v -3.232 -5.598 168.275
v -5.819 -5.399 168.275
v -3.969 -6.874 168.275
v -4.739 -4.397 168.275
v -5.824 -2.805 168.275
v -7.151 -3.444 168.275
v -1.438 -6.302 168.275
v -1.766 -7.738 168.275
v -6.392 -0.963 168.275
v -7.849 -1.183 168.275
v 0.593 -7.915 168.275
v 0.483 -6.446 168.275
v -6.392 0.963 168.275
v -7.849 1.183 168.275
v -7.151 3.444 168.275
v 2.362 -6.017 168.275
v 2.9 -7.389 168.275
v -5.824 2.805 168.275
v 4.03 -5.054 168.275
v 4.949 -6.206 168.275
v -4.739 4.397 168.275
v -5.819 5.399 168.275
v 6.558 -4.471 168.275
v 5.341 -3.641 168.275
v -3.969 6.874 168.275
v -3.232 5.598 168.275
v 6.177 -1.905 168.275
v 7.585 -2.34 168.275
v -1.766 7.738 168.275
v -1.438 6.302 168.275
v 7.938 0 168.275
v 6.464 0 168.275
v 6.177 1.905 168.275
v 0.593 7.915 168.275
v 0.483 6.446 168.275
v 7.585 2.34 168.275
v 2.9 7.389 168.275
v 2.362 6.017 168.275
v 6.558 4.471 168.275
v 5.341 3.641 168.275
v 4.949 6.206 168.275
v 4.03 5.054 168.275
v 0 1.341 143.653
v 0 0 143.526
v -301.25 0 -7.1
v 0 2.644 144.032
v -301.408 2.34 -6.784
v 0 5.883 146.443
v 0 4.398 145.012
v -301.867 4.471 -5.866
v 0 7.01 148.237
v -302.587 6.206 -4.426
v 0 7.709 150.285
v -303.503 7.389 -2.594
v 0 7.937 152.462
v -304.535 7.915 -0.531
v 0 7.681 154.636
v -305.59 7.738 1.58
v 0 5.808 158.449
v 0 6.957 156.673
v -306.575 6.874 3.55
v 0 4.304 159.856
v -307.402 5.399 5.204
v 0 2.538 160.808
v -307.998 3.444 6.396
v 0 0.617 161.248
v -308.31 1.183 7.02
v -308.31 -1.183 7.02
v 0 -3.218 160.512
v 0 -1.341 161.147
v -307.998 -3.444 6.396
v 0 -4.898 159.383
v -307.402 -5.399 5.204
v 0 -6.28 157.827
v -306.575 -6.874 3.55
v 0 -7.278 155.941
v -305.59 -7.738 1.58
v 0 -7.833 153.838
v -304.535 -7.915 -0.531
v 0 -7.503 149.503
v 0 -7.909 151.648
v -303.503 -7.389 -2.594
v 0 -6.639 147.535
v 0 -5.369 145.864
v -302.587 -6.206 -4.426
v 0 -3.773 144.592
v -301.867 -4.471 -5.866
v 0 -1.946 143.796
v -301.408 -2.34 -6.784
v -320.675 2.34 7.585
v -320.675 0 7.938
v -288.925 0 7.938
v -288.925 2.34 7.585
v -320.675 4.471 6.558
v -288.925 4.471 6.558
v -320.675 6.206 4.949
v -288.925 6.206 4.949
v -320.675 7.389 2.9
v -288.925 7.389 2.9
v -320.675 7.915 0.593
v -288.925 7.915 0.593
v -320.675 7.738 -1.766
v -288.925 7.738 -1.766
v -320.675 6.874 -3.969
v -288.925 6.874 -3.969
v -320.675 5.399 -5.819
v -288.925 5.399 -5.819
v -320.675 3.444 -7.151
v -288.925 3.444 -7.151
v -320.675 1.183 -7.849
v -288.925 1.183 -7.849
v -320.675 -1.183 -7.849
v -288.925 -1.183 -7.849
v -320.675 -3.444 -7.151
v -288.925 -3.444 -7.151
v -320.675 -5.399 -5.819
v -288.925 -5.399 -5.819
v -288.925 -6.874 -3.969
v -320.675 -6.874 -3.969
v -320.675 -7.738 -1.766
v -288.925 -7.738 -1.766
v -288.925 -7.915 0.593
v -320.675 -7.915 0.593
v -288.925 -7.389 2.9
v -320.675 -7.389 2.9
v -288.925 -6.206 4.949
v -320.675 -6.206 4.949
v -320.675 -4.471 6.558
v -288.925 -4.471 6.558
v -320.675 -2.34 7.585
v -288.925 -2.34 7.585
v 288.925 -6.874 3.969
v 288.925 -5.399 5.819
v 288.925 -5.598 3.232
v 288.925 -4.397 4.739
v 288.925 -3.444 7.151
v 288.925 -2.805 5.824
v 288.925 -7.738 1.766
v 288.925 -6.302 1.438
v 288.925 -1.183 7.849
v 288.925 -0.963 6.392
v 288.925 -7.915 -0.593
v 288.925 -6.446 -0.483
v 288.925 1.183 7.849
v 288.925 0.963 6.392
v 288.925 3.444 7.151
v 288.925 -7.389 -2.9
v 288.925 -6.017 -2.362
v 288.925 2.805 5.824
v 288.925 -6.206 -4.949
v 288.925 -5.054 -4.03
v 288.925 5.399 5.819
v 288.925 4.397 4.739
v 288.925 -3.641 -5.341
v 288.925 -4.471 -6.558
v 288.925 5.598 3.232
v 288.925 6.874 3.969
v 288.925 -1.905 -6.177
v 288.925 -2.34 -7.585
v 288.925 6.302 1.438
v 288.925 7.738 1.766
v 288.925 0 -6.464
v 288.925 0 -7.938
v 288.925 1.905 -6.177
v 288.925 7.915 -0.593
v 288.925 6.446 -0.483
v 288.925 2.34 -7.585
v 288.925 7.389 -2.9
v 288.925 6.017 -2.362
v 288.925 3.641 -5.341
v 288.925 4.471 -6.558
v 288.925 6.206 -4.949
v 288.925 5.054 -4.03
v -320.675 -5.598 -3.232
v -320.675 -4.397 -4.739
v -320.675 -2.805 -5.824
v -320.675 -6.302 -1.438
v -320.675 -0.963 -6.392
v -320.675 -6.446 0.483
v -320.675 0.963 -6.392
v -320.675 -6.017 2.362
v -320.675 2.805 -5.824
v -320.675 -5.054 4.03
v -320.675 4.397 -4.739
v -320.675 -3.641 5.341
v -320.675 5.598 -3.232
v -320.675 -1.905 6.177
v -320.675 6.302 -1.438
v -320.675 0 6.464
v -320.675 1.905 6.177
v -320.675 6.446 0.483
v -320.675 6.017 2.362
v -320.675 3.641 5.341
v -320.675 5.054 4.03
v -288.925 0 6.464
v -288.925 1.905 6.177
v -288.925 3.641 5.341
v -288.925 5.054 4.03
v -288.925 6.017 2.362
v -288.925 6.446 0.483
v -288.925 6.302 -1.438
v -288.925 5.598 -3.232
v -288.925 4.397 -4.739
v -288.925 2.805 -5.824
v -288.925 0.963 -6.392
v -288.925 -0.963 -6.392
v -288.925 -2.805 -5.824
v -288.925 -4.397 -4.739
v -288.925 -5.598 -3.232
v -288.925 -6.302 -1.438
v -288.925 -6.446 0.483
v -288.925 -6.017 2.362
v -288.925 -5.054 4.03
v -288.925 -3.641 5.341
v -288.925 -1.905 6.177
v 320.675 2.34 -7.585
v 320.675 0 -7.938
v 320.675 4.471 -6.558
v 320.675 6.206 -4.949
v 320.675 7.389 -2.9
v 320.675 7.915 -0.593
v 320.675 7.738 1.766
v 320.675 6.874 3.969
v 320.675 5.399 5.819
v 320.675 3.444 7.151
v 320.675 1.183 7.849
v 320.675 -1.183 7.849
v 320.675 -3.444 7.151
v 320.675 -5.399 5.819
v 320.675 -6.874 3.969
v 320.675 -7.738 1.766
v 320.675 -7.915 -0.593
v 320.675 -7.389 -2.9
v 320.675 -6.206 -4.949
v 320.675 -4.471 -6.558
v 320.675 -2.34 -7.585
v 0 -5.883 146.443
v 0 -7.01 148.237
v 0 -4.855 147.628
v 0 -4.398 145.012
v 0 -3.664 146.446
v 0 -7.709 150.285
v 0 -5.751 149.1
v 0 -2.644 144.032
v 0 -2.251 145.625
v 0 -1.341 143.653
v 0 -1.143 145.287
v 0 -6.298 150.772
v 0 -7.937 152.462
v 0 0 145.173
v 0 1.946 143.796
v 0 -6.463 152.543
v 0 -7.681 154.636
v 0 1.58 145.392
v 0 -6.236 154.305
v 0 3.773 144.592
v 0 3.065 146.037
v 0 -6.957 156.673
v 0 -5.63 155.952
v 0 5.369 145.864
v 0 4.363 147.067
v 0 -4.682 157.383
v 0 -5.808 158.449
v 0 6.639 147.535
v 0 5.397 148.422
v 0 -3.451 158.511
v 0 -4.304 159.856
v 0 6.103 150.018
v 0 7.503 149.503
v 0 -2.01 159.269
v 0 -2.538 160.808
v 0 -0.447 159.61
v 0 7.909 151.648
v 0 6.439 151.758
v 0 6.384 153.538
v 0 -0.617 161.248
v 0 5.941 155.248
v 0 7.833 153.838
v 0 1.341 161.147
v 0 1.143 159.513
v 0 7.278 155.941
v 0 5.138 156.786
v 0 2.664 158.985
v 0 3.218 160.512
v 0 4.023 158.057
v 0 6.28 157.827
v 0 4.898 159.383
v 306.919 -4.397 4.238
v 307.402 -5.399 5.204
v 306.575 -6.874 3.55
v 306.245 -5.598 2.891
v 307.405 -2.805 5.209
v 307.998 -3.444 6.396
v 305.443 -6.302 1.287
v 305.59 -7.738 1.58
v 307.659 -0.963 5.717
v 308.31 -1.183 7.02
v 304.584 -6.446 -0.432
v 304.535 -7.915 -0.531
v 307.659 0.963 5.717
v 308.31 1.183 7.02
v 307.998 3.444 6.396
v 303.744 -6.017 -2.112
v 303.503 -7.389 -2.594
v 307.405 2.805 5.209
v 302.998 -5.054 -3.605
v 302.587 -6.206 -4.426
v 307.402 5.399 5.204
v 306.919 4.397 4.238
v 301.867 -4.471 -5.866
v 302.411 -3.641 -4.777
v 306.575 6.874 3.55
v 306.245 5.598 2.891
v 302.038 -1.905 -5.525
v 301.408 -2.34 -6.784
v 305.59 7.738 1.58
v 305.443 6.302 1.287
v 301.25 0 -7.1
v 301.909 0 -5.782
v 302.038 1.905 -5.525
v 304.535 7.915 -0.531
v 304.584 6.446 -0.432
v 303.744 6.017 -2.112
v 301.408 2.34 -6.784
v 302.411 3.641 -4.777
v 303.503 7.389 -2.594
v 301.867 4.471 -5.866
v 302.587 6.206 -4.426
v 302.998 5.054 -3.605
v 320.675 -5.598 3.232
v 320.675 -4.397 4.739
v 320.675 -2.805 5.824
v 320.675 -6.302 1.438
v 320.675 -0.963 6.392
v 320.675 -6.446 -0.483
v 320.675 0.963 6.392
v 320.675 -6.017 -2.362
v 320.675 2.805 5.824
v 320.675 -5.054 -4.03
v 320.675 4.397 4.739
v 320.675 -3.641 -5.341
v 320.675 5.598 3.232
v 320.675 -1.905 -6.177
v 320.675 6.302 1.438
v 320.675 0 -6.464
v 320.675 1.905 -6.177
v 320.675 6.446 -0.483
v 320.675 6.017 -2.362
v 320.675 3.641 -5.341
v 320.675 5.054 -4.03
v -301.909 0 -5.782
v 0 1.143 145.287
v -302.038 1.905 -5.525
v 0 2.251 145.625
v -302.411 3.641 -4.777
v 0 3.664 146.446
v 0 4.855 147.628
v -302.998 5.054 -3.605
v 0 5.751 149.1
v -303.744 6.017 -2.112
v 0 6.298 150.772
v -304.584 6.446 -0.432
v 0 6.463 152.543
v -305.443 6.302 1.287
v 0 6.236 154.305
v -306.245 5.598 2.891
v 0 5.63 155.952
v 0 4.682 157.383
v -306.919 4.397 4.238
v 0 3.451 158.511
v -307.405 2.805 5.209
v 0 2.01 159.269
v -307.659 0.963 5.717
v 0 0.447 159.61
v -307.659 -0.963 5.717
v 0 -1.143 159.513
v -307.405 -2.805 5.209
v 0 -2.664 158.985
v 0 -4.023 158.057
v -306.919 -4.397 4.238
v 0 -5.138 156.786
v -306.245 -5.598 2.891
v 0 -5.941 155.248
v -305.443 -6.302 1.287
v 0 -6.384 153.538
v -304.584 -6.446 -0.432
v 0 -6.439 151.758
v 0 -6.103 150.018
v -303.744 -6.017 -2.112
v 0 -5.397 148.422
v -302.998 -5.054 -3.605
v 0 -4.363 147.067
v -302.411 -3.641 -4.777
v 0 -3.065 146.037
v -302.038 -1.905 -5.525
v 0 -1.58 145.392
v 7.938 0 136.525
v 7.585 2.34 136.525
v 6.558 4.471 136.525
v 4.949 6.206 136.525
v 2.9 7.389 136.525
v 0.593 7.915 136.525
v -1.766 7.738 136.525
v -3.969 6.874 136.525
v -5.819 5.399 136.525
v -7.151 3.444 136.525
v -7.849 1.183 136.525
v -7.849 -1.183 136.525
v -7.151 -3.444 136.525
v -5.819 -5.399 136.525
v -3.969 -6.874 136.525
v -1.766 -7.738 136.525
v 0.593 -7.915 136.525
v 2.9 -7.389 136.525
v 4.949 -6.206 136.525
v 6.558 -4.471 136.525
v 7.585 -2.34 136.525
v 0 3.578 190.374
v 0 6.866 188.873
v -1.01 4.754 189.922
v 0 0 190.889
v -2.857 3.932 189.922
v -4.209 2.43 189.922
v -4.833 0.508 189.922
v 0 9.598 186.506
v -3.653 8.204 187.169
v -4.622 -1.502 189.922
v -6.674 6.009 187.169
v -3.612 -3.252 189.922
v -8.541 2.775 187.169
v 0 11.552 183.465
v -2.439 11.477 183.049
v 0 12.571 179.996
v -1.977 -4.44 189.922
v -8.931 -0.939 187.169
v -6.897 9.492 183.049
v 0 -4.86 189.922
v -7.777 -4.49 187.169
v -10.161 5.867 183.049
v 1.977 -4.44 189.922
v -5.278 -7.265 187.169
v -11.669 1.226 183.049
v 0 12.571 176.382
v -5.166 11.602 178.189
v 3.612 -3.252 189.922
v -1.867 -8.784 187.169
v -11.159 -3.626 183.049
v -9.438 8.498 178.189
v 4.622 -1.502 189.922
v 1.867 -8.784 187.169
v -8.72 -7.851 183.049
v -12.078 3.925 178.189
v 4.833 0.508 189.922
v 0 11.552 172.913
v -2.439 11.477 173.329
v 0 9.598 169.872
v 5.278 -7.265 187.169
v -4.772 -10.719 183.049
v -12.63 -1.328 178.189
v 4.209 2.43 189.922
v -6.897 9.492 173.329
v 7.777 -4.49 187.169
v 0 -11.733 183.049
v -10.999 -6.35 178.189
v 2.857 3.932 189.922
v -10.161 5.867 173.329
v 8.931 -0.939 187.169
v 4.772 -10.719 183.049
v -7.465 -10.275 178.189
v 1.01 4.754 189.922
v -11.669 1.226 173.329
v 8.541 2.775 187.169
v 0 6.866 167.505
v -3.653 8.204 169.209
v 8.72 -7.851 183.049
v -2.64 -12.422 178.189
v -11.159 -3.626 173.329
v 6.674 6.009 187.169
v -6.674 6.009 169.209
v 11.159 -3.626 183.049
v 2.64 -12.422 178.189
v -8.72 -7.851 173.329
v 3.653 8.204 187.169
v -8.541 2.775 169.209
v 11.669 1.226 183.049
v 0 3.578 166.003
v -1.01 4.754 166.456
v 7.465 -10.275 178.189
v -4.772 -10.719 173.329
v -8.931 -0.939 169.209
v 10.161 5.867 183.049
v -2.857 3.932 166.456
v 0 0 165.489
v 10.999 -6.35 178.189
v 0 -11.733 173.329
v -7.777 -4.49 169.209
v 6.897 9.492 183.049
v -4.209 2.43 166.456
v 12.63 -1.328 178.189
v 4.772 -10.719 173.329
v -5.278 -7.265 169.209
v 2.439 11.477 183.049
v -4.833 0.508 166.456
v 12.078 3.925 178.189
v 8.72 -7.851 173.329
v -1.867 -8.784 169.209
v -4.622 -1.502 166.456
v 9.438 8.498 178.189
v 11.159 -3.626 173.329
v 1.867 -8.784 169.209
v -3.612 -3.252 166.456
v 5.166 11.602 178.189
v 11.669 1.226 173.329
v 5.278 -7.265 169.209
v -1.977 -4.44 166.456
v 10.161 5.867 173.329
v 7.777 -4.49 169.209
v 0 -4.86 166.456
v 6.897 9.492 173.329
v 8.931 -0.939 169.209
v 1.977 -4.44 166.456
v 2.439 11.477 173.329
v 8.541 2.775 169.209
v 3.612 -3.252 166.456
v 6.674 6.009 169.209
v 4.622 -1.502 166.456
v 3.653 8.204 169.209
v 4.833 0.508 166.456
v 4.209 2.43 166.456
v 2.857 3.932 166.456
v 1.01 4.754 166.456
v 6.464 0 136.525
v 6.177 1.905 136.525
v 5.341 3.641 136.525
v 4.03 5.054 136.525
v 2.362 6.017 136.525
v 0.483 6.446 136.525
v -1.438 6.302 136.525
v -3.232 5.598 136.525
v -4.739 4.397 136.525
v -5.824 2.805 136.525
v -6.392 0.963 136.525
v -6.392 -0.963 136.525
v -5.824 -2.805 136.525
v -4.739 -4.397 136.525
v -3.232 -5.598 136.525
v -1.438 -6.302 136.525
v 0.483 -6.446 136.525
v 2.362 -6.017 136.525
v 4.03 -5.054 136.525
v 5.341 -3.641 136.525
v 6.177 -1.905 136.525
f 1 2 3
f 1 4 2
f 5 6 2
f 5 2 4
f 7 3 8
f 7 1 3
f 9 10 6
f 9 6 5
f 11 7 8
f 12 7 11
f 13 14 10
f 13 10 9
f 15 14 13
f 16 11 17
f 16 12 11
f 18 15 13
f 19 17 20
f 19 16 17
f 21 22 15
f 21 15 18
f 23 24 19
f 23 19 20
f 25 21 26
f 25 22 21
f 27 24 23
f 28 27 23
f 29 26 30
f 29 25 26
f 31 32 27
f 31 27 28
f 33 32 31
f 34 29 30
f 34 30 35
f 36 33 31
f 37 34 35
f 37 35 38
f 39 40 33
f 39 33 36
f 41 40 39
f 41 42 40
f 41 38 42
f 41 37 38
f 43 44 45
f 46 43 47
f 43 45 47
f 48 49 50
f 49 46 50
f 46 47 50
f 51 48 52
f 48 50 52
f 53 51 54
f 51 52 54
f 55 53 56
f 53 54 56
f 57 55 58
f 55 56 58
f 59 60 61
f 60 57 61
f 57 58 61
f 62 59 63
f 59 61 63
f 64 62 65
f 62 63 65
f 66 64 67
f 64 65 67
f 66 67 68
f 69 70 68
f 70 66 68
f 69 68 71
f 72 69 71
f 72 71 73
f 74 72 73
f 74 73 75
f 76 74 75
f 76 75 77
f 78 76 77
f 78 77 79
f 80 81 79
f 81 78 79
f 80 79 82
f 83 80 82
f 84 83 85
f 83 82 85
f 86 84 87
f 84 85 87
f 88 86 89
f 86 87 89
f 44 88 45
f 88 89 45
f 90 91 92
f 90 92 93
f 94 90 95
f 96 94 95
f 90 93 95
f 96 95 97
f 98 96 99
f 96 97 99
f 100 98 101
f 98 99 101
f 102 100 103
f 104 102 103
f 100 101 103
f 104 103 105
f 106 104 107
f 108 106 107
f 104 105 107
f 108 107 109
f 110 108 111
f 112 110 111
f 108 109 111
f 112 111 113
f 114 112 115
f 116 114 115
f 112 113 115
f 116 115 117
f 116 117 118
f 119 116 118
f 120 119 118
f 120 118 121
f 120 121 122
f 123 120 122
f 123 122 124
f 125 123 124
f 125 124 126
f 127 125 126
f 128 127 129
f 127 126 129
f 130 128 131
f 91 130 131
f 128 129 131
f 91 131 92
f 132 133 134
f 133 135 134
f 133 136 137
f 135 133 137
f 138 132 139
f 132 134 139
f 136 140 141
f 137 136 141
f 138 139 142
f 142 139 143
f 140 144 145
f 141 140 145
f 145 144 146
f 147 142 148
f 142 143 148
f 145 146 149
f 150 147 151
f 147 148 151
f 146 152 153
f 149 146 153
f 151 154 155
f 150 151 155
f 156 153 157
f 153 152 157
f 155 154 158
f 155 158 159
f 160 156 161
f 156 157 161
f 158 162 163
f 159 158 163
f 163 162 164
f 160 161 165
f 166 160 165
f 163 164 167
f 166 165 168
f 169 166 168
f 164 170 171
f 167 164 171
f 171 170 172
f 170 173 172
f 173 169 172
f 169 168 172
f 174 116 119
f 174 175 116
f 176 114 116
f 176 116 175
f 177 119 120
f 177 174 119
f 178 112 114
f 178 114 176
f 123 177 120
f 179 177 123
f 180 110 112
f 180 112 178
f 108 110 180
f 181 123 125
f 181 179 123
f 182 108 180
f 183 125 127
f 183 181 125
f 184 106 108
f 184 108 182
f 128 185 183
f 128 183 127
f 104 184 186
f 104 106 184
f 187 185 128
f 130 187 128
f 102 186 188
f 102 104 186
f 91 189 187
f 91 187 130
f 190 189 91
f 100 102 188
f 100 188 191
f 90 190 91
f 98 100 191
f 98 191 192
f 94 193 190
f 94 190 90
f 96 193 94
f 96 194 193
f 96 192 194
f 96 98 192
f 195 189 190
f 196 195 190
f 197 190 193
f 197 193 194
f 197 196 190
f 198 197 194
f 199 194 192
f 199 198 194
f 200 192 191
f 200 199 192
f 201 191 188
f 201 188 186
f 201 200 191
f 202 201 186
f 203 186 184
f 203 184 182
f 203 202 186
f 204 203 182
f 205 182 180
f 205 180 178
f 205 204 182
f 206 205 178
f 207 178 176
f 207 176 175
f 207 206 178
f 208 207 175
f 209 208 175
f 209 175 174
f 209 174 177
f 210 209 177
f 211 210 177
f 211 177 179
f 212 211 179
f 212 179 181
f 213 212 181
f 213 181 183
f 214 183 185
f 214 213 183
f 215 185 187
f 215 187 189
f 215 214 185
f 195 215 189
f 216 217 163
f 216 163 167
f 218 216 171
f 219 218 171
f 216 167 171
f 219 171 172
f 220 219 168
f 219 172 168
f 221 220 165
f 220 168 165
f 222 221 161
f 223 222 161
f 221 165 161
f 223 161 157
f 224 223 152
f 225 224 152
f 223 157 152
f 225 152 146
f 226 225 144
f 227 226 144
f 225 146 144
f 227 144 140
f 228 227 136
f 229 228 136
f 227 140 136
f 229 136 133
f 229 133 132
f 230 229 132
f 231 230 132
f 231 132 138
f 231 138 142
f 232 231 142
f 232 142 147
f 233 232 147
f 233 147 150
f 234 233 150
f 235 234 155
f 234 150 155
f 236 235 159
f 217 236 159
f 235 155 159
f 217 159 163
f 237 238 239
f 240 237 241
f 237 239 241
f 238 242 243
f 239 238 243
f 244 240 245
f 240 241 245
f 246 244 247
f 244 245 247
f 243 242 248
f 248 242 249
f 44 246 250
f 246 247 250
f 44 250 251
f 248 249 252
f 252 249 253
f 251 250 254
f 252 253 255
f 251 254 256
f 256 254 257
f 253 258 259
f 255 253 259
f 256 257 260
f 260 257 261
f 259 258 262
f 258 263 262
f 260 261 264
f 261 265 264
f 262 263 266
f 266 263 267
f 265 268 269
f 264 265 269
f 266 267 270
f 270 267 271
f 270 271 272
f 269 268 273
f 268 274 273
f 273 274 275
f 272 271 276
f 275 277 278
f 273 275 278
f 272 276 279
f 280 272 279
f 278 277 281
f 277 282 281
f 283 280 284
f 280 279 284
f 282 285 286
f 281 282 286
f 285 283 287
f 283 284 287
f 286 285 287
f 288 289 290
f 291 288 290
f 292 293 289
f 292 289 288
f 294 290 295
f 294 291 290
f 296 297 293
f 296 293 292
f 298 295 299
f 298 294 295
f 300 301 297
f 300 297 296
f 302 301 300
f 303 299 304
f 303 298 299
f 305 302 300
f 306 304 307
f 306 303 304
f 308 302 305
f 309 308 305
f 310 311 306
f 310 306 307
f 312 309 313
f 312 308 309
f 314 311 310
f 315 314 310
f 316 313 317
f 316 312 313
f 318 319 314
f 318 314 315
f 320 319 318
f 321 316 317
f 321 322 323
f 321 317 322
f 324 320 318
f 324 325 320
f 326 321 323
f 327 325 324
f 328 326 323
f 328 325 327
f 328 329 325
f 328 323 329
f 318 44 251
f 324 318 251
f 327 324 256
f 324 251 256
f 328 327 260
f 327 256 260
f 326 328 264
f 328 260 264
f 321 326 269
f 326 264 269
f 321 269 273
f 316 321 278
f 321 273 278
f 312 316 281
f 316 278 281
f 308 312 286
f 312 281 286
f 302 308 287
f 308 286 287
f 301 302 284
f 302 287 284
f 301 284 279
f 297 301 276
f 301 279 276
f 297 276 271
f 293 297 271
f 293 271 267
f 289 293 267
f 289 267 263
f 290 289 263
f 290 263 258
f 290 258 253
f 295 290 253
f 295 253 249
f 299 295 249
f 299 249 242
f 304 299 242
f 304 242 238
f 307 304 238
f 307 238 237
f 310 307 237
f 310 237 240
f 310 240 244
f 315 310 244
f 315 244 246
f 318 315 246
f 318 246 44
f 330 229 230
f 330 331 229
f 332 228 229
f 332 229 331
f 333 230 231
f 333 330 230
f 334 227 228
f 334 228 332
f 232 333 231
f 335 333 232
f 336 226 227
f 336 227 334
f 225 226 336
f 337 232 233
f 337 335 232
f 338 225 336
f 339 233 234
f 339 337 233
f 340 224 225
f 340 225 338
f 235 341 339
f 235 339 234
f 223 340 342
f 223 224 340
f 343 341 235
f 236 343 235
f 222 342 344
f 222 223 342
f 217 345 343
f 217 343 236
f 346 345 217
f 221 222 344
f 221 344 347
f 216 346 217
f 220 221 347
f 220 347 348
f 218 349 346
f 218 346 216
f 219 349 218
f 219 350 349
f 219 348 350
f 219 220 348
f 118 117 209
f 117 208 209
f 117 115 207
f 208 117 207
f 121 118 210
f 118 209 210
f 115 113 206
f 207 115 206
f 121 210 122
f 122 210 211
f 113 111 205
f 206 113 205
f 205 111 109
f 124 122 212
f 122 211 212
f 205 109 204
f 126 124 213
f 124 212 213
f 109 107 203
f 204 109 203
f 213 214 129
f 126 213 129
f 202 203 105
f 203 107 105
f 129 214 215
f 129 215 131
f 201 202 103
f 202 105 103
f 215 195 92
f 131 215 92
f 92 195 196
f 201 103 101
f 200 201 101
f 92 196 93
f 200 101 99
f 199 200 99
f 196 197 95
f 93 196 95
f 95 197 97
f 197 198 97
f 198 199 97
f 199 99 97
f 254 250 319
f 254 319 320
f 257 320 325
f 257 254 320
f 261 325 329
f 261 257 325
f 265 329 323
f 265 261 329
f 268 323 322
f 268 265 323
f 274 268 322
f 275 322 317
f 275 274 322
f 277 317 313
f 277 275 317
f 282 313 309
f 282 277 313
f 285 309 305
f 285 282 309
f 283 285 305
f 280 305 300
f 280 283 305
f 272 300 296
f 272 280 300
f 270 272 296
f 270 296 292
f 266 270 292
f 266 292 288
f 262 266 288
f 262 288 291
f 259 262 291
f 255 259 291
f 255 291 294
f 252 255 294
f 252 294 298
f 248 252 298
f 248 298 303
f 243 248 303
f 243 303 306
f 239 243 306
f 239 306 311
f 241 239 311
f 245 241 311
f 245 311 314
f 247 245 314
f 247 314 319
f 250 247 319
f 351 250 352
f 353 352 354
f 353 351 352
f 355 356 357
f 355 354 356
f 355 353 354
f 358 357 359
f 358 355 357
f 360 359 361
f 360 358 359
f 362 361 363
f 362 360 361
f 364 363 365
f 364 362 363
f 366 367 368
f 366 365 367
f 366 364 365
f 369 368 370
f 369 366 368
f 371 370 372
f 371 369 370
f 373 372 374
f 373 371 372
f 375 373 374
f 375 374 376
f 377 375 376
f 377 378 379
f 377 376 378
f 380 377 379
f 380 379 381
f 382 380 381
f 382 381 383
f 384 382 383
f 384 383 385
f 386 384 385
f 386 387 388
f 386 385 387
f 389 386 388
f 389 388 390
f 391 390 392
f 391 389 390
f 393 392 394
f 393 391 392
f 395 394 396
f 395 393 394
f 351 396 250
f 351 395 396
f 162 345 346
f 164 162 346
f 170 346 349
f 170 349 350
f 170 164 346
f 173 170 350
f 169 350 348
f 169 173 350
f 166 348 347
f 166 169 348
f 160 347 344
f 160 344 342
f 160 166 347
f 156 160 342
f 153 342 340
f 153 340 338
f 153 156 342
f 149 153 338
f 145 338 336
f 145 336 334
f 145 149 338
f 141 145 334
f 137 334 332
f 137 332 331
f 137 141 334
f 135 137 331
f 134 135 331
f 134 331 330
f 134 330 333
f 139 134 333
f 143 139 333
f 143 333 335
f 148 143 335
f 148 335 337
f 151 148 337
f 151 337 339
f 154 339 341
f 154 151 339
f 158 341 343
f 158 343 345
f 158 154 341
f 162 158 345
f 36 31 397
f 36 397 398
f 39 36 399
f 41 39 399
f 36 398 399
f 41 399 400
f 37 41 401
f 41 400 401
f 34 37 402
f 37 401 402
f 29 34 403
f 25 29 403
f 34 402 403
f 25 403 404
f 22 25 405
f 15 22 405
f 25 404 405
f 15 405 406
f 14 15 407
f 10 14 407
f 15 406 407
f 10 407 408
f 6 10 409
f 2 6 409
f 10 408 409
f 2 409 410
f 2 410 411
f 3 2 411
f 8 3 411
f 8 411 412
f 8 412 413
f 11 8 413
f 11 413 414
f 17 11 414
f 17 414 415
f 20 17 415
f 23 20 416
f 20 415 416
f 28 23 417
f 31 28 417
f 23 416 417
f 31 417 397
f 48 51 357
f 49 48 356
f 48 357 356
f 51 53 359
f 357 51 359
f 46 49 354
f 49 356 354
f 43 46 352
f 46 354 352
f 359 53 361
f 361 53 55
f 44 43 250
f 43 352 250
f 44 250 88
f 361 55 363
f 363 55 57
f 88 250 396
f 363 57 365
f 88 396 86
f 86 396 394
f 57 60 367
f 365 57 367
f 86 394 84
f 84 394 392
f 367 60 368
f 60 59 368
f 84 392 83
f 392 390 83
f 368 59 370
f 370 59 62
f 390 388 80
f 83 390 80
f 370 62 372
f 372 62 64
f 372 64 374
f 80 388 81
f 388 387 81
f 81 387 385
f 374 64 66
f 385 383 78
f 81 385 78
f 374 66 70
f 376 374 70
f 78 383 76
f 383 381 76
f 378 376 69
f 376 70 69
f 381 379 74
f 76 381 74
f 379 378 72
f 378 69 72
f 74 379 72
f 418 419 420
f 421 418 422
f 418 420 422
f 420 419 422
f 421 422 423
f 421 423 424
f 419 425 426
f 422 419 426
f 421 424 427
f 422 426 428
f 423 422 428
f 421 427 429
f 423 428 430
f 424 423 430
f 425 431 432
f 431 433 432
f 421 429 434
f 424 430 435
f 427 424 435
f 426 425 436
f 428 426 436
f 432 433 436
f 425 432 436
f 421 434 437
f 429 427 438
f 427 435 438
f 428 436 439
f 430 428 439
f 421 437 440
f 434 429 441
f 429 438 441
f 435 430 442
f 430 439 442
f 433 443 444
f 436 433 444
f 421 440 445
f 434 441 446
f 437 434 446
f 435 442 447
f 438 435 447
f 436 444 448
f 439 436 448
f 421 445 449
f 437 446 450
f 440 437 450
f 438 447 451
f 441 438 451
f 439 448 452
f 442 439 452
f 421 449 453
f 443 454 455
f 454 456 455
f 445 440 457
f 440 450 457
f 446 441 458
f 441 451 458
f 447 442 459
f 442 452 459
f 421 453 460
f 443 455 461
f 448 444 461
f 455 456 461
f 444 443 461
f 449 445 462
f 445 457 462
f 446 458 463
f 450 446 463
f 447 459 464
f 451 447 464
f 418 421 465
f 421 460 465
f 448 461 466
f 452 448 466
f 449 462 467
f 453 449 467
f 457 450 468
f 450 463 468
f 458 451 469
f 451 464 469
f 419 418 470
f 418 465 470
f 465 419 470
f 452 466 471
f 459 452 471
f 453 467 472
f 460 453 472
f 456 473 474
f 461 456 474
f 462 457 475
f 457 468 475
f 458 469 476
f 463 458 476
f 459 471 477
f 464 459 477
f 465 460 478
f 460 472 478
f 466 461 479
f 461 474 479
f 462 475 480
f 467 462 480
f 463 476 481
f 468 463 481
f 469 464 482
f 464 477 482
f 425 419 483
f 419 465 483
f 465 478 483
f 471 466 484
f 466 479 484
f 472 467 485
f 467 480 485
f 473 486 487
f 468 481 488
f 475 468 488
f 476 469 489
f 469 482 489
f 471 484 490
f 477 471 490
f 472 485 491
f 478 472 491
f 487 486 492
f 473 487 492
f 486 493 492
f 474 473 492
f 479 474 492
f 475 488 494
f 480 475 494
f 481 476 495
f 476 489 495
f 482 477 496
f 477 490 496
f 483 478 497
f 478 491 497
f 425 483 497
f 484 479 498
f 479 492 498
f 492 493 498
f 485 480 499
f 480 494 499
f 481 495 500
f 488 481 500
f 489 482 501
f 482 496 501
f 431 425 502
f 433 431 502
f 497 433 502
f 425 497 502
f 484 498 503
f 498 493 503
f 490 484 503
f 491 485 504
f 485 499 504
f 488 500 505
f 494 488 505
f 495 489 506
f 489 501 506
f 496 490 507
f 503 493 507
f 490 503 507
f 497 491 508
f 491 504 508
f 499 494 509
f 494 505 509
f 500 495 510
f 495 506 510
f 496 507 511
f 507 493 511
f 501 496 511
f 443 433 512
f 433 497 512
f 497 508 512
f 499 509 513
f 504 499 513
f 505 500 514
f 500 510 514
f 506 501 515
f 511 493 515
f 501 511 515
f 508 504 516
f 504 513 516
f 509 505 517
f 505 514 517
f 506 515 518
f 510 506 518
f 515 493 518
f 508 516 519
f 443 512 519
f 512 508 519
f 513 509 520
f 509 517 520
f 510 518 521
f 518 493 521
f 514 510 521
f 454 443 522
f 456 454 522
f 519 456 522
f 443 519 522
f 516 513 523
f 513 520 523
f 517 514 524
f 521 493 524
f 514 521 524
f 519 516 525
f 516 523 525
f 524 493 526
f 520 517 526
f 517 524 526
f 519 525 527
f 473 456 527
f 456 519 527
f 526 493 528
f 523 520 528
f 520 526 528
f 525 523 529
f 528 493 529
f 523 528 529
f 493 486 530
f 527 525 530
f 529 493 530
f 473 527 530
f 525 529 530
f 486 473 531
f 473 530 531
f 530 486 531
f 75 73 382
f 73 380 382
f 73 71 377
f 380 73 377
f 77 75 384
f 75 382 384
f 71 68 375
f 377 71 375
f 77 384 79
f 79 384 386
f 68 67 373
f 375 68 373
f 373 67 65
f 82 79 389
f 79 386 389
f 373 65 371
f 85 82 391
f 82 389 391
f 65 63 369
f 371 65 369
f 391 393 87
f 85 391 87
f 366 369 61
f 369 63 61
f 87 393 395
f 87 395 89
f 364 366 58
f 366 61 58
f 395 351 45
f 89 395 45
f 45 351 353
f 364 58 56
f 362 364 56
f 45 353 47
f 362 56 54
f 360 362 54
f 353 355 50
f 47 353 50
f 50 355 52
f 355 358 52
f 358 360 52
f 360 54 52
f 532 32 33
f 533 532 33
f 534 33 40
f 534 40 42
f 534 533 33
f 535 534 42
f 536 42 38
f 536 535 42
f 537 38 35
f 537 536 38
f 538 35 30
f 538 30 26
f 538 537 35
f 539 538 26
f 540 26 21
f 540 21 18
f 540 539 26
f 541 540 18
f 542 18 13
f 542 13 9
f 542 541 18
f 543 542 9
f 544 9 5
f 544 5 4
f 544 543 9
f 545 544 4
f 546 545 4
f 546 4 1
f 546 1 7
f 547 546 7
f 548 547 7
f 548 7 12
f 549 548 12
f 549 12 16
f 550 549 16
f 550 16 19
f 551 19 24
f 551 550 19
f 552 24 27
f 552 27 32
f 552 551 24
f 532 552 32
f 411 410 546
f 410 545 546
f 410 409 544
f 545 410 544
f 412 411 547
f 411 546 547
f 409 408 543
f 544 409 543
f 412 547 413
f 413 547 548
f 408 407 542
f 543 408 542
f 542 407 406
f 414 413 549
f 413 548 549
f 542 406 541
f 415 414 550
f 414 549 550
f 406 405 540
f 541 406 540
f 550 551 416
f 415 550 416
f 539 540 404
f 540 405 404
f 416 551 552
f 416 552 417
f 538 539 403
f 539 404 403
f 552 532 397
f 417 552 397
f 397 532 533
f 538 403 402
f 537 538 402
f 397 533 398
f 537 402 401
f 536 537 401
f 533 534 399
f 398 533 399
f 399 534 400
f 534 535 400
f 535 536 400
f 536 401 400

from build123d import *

# Parameters (mm, degrees)
SKETCH11_R                                     = 7.9375
SKETCH11_R_2                                   = 6.4643
AL_ROUND_TUBING_AL_RND_TUBE_0_625_OD_X_0_DEPTH = 347.389419847
SKETCH11_ON_SEGMENT_2_R                        = 7.9375
SKETCH11_ON_SEGMENT_2_R_2                      = 6.4643
AL_ROUND_TUBING_AL_RND_TUBE_0_625_OD_3_DEPTH   = 347.389419847
SKETCH12_R                                     = 7.9375
SKETCH12_R_2                                   = 6.4643
AL_ROUND_TUBING_AL_RND_TUBE_0_625_OD_4_DEPTH   = 31.75
SKETCH12_ON_SEGMENT_2_R                        = 7.9375
SKETCH12_ON_SEGMENT_2_R_2                      = 6.4643
AL_ROUND_TUBING_AL_RND_TUBE_0_625_OD_4_2_DEPTH = 31.75
SKETCH12_ON_SEGMENT_3_R                        = 7.9375
SKETCH12_ON_SEGMENT_3_R_2                      = 6.4643
AL_ROUND_TUBING_AL_RND_TUBE_0_625_OD_4_3_DEPTH = 31.75


with BuildPart() as part:
    # Sketch11 → Al round tubing AL RND TUBE 0.625 OD X 0 (new body)
    with BuildSketch(Plane(origin=(-304.8, 0, 0), x_dir=(0.447213595499958, 0, -0.894427190999916), z_dir=(0.894427190999916, 0, 0.447213595499958))):
        Circle(SKETCH11_R)
        Circle(SKETCH11_R_2, mode=Mode.SUBTRACT)
    extrude(amount=AL_ROUND_TUBING_AL_RND_TUBE_0_625_OD_X_0_DEPTH)

    # Al round tubing AL RND TUBE 0.625 OD 2
    split(bisect_by=Plane(origin=(0, 0, 152.4), x_dir=(0, -1, 0), z_dir=(-1, 0, 0)), keep=Keep.TOP)


with BuildPart() as body_2:
    # Sketch11 on segment 2 (carried to segment 2) → Al round tubing AL RND TUBE 0.625 OD 3 (new body)
    with BuildSketch(Plane(origin=(-5.914542977, 0, 155.357271488), x_dir=(-0.447213595, 0, -0.894427191), z_dir=(0.894427191, 0, -0.447213595))):
        Circle(SKETCH11_ON_SEGMENT_2_R)
        Circle(SKETCH11_ON_SEGMENT_2_R_2, mode=Mode.SUBTRACT)
    extrude(amount=AL_ROUND_TUBING_AL_RND_TUBE_0_625_OD_3_DEPTH)

    # Al round tubing AL RND TUBE 0.625 OD 3 m
    split(bisect_by=Plane(origin=(0, 0, 152.4), x_dir=(0, 1, 0), z_dir=(1, 0, 0)), keep=Keep.TOP)


with BuildPart() as body_3:
    # Sketch12 → Al round tubing AL RND TUBE 0.625 OD 4 (new body)
    with BuildSketch(Plane.XY.offset(136.525)):
        Circle(SKETCH12_R)
        Circle(SKETCH12_R_2, mode=Mode.SUBTRACT)
    extrude(amount=AL_ROUND_TUBING_AL_RND_TUBE_0_625_OD_4_DEPTH)


with BuildPart() as body_4:
    # Sketch12 on segment 2 (carried to segment 2) → Al round tubing AL RND TUBE 0.625 OD 4 2 (new body)
    with BuildSketch(Plane.ZY.offset(288.925)):
        Circle(SKETCH12_ON_SEGMENT_2_R)
        Circle(SKETCH12_ON_SEGMENT_2_R_2, mode=Mode.SUBTRACT)
    extrude(amount=AL_ROUND_TUBING_AL_RND_TUBE_0_625_OD_4_2_DEPTH)


with BuildPart() as body_5:
    # Sketch12 on segment 3 (carried to segment 3) → Al round tubing AL RND TUBE 0.625 OD 4 3 (new body)
    with BuildSketch(Plane(origin=(288.925, 0, 0), x_dir=(0, 0, -1), z_dir=(1, 0, 0))):
        Circle(SKETCH12_ON_SEGMENT_3_R)
        Circle(SKETCH12_ON_SEGMENT_3_R_2, mode=Mode.SUBTRACT)
    extrude(amount=AL_ROUND_TUBING_AL_RND_TUBE_0_625_OD_4_3_DEPTH)


with BuildPart() as body_6:
    # Sketch13 → Revolve1 (revolve)
    with BuildSketch(Plane(origin=(0, 0, 0), x_dir=(0, 0, -1), z_dir=(1, 0, 0))):
        with BuildLine():
            Line((-165.488934322, 0), (-190.888934322, 0))
            ThreePointArc((-190.888934322, 0), (-178.188934322, 12.7), (-165.488934322, 0))
        make_face()
    revolve(axis=Axis((0, 0, 165.488934322), (0, 0, 1)))


solid = Compound([part.part, body_2.part, body_3.part, body_4.part, body_5.part, body_6.part])
